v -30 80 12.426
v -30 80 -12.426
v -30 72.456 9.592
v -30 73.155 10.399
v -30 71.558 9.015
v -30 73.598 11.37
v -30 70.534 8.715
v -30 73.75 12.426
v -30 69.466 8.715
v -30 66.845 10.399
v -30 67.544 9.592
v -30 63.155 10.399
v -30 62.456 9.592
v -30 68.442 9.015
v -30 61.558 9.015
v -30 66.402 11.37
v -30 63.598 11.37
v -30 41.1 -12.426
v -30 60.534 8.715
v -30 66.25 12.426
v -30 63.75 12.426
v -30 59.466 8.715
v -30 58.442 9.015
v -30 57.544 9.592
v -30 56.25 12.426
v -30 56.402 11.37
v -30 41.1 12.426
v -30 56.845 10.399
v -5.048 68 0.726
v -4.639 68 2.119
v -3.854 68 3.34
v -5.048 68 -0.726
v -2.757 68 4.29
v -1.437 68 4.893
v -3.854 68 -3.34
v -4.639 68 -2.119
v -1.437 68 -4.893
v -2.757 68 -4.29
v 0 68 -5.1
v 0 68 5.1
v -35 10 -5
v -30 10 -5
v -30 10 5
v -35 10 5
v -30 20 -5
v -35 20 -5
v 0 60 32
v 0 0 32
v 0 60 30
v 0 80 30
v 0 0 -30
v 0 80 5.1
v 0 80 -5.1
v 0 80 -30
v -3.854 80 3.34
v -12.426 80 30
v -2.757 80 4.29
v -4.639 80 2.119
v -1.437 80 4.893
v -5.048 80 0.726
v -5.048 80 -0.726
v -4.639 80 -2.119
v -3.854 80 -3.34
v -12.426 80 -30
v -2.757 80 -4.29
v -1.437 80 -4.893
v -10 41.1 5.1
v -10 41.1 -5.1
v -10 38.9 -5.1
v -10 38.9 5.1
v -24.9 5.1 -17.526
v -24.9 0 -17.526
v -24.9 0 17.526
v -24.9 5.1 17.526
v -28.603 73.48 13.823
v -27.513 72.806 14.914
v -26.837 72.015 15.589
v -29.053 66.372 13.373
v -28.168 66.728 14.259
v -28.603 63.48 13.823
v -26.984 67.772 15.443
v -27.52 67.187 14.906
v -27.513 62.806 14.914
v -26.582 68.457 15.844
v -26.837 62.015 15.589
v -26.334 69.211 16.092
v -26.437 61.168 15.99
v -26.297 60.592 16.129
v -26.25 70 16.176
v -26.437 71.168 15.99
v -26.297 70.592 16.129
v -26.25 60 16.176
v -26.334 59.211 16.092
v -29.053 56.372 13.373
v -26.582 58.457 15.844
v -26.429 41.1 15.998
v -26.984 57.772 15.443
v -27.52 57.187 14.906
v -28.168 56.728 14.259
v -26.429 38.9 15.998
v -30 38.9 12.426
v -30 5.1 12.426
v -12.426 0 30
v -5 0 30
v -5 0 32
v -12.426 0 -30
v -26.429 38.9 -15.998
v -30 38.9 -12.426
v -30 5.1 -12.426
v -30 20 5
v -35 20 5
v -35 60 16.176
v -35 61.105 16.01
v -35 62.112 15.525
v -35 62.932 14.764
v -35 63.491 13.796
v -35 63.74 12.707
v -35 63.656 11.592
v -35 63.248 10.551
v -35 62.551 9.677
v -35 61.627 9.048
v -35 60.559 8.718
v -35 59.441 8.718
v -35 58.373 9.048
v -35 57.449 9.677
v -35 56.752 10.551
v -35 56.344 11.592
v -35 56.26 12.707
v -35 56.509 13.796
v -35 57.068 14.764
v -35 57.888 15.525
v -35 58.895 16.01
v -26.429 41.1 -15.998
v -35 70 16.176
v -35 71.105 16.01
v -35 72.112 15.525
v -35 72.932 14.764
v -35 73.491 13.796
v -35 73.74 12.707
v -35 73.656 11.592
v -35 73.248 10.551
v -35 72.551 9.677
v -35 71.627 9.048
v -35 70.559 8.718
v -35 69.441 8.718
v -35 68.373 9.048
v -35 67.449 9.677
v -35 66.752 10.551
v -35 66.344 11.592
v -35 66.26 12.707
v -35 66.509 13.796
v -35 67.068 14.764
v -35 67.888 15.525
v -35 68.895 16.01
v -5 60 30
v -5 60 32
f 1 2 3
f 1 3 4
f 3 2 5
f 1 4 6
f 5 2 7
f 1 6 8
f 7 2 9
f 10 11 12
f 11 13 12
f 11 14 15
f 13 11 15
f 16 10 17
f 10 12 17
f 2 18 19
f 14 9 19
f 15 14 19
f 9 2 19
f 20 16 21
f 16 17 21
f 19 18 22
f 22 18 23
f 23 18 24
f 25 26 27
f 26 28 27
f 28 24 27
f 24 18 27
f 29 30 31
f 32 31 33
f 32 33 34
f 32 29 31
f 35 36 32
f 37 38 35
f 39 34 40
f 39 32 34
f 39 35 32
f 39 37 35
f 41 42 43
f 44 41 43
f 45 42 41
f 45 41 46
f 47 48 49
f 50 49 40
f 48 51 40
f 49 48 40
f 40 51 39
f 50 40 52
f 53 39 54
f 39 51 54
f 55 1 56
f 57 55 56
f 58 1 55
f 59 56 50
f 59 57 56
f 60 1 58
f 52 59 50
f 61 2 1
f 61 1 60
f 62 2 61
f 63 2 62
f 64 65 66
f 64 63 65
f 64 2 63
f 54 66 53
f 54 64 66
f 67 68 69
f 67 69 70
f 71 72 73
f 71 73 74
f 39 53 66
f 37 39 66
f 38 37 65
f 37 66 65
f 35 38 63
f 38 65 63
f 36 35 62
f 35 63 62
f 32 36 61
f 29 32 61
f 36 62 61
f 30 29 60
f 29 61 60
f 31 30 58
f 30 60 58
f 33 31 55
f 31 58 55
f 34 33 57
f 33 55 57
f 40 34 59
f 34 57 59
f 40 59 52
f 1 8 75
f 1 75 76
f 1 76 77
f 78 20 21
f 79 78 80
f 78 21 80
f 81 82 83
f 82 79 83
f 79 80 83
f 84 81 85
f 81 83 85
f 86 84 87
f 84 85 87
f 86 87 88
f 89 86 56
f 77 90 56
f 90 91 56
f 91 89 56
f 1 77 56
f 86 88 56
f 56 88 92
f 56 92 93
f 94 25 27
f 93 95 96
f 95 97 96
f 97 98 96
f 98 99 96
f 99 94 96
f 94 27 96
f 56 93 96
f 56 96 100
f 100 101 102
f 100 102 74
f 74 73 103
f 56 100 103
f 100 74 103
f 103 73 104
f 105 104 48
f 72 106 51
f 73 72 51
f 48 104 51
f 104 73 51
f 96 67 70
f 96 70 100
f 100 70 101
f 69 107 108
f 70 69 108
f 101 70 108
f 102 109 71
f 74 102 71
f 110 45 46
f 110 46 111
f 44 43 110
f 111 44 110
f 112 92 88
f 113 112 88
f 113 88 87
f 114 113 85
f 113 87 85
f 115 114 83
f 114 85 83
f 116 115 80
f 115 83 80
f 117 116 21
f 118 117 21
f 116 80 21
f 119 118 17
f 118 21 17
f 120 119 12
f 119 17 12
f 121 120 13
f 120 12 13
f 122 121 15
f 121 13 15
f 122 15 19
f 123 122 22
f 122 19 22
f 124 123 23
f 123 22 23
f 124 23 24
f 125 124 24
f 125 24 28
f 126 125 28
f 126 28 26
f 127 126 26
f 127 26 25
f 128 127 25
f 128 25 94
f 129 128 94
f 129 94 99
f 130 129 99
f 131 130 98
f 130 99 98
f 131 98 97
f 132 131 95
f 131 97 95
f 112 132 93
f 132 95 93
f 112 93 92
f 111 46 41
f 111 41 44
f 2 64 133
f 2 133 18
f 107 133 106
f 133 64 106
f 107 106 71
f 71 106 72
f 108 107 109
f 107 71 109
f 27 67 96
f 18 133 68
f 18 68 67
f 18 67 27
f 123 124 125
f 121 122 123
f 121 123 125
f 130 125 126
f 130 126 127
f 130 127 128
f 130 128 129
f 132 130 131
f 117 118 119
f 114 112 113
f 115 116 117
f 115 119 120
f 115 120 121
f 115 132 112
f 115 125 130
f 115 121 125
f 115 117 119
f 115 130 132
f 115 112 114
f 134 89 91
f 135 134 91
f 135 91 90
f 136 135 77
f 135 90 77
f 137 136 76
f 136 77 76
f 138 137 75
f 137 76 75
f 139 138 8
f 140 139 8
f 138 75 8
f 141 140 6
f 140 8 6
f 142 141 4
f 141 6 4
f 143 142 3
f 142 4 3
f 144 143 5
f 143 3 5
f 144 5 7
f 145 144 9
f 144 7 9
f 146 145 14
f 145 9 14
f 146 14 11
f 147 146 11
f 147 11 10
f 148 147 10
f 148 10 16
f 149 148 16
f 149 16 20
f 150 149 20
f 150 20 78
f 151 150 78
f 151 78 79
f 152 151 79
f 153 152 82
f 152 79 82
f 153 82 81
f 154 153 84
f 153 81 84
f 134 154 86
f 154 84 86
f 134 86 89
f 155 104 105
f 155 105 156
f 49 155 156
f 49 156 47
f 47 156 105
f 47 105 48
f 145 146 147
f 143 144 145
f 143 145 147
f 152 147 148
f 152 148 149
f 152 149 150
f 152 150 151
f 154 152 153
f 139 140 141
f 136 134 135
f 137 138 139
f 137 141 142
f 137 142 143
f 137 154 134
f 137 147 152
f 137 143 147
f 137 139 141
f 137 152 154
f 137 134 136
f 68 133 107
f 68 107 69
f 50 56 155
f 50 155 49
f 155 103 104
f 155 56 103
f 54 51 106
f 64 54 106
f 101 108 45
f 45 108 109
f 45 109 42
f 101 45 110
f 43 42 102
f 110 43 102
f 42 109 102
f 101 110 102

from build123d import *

# Parameters (mm, degrees)
BOSS_EXTRUDE1_DEPTH      = 80
CUT_EXTRUDE1_DEPTH       = 1.1
SKETCH4_W                = 30
SKETCH4_H                = 60
CUT_EXTRUDE2_DEPTH       = 91.553851381
SKETCH5_R                = 5.1
CUT_EXTRUDE3_DEPTH       = 12
BOSS_EXTRUDE2_DEPTH      = 5
BOSS_EXTRUDE2_DEPTH_BACK = 12
SKETCH6_R                = 3.75
SKETCH6_W                = 10
SKETCH6_H                = 10
SKETCH7_W                = 5
SKETCH7_H                = 60
BOSS_EXTRUDE3_DEPTH      = 2
SKETCH8_W                = 5.1
SKETCH8_H                = 5.1
CUT_EXTRUDE4_DEPTH       = 106.948100502


with BuildPart() as part:
    # Sketch1 → Boss-Extrude1 (new body)
    with BuildSketch(Plane(origin=(0, 0, 0), x_dir=(1, 0, 0), z_dir=(0, 1, 0))):
        Polygon((12.426406871, -30), (30, -12.426406871), (30, 12.426406871), (12.426406871, 30), (-12.426406871, 30), (-30, 12.426406871), (-30, -12.426406871), (-12.426406871, -30), align=None)
    extrude(amount=BOSS_EXTRUDE1_DEPTH)

    # Sketch3 → Cut-Extrude1 (cut, symmetric)
    with BuildSketch(Plane(origin=(0, 40, 0), x_dir=(1, 0, 0), z_dir=(0, 1, 0))):
        Polygon((40, 25), (10, 5.1), (10, -5.1), (40, -25), align=None)
    cut_extrude1 = extrude(amount=CUT_EXTRUDE1_DEPTH, both=True, mode=Mode.SUBTRACT)

    # Mirror1: Cut-Extrude1 across plane
    add(cut_extrude1.mirror(Plane(origin=(0, 0, 0), x_dir=(0, 0, 1), z_dir=(1, 0, 0))), mode=Mode.SUBTRACT)

    # Sketch4 → Cut-Extrude2 (cut, through all)
    with BuildSketch(Plane(origin=(0, 80, 0), x_dir=(1, 0, 0), z_dir=(0, 1, 0))):
        with Locations((15, 0)):
            Rectangle(SKETCH4_W, SKETCH4_H)
    extrude(amount=-CUT_EXTRUDE2_DEPTH, mode=Mode.SUBTRACT)

    # Sketch5 → Cut-Extrude3 (cut)
    with BuildSketch(Plane(origin=(0, 80, 0), x_dir=(1, 0, 0), z_dir=(0, 1, 0))):
        Circle(SKETCH5_R)
    extrude(amount=-CUT_EXTRUDE3_DEPTH, mode=Mode.SUBTRACT)

    # Sketch6 → Boss-Extrude2 (add, two sides: drawn at the far end of the back side and taken through both)
    with BuildSketch(Plane.ZY.offset(30).offset(-BOSS_EXTRUDE2_DEPTH_BACK)):
        with Locations((12.426406871, 70)):
            Circle(SKETCH6_R)
        with Locations((12.426406871, 60)):
            Circle(SKETCH6_R)
        with Locations((0, 15)):
            Rectangle(SKETCH6_W, SKETCH6_H)
    extrude(amount=BOSS_EXTRUDE2_DEPTH + BOSS_EXTRUDE2_DEPTH_BACK)

    # Sketch7 → Boss-Extrude3 (add)
    with BuildSketch(Plane.XY.offset(30)):
        with Locations((-2.5, 30)):
            Rectangle(SKETCH7_W, SKETCH7_H)
    extrude(amount=BOSS_EXTRUDE3_DEPTH)

    # Sketch8 → Cut-Extrude4 (cut, through all)
    with BuildSketch(Plane.XY.offset(30)):
        with Locations((-27.45, 2.55)):
            Rectangle(SKETCH8_W, SKETCH8_H)
    extrude(amount=-CUT_EXTRUDE4_DEPTH, mode=Mode.SUBTRACT)


solid = part.part
